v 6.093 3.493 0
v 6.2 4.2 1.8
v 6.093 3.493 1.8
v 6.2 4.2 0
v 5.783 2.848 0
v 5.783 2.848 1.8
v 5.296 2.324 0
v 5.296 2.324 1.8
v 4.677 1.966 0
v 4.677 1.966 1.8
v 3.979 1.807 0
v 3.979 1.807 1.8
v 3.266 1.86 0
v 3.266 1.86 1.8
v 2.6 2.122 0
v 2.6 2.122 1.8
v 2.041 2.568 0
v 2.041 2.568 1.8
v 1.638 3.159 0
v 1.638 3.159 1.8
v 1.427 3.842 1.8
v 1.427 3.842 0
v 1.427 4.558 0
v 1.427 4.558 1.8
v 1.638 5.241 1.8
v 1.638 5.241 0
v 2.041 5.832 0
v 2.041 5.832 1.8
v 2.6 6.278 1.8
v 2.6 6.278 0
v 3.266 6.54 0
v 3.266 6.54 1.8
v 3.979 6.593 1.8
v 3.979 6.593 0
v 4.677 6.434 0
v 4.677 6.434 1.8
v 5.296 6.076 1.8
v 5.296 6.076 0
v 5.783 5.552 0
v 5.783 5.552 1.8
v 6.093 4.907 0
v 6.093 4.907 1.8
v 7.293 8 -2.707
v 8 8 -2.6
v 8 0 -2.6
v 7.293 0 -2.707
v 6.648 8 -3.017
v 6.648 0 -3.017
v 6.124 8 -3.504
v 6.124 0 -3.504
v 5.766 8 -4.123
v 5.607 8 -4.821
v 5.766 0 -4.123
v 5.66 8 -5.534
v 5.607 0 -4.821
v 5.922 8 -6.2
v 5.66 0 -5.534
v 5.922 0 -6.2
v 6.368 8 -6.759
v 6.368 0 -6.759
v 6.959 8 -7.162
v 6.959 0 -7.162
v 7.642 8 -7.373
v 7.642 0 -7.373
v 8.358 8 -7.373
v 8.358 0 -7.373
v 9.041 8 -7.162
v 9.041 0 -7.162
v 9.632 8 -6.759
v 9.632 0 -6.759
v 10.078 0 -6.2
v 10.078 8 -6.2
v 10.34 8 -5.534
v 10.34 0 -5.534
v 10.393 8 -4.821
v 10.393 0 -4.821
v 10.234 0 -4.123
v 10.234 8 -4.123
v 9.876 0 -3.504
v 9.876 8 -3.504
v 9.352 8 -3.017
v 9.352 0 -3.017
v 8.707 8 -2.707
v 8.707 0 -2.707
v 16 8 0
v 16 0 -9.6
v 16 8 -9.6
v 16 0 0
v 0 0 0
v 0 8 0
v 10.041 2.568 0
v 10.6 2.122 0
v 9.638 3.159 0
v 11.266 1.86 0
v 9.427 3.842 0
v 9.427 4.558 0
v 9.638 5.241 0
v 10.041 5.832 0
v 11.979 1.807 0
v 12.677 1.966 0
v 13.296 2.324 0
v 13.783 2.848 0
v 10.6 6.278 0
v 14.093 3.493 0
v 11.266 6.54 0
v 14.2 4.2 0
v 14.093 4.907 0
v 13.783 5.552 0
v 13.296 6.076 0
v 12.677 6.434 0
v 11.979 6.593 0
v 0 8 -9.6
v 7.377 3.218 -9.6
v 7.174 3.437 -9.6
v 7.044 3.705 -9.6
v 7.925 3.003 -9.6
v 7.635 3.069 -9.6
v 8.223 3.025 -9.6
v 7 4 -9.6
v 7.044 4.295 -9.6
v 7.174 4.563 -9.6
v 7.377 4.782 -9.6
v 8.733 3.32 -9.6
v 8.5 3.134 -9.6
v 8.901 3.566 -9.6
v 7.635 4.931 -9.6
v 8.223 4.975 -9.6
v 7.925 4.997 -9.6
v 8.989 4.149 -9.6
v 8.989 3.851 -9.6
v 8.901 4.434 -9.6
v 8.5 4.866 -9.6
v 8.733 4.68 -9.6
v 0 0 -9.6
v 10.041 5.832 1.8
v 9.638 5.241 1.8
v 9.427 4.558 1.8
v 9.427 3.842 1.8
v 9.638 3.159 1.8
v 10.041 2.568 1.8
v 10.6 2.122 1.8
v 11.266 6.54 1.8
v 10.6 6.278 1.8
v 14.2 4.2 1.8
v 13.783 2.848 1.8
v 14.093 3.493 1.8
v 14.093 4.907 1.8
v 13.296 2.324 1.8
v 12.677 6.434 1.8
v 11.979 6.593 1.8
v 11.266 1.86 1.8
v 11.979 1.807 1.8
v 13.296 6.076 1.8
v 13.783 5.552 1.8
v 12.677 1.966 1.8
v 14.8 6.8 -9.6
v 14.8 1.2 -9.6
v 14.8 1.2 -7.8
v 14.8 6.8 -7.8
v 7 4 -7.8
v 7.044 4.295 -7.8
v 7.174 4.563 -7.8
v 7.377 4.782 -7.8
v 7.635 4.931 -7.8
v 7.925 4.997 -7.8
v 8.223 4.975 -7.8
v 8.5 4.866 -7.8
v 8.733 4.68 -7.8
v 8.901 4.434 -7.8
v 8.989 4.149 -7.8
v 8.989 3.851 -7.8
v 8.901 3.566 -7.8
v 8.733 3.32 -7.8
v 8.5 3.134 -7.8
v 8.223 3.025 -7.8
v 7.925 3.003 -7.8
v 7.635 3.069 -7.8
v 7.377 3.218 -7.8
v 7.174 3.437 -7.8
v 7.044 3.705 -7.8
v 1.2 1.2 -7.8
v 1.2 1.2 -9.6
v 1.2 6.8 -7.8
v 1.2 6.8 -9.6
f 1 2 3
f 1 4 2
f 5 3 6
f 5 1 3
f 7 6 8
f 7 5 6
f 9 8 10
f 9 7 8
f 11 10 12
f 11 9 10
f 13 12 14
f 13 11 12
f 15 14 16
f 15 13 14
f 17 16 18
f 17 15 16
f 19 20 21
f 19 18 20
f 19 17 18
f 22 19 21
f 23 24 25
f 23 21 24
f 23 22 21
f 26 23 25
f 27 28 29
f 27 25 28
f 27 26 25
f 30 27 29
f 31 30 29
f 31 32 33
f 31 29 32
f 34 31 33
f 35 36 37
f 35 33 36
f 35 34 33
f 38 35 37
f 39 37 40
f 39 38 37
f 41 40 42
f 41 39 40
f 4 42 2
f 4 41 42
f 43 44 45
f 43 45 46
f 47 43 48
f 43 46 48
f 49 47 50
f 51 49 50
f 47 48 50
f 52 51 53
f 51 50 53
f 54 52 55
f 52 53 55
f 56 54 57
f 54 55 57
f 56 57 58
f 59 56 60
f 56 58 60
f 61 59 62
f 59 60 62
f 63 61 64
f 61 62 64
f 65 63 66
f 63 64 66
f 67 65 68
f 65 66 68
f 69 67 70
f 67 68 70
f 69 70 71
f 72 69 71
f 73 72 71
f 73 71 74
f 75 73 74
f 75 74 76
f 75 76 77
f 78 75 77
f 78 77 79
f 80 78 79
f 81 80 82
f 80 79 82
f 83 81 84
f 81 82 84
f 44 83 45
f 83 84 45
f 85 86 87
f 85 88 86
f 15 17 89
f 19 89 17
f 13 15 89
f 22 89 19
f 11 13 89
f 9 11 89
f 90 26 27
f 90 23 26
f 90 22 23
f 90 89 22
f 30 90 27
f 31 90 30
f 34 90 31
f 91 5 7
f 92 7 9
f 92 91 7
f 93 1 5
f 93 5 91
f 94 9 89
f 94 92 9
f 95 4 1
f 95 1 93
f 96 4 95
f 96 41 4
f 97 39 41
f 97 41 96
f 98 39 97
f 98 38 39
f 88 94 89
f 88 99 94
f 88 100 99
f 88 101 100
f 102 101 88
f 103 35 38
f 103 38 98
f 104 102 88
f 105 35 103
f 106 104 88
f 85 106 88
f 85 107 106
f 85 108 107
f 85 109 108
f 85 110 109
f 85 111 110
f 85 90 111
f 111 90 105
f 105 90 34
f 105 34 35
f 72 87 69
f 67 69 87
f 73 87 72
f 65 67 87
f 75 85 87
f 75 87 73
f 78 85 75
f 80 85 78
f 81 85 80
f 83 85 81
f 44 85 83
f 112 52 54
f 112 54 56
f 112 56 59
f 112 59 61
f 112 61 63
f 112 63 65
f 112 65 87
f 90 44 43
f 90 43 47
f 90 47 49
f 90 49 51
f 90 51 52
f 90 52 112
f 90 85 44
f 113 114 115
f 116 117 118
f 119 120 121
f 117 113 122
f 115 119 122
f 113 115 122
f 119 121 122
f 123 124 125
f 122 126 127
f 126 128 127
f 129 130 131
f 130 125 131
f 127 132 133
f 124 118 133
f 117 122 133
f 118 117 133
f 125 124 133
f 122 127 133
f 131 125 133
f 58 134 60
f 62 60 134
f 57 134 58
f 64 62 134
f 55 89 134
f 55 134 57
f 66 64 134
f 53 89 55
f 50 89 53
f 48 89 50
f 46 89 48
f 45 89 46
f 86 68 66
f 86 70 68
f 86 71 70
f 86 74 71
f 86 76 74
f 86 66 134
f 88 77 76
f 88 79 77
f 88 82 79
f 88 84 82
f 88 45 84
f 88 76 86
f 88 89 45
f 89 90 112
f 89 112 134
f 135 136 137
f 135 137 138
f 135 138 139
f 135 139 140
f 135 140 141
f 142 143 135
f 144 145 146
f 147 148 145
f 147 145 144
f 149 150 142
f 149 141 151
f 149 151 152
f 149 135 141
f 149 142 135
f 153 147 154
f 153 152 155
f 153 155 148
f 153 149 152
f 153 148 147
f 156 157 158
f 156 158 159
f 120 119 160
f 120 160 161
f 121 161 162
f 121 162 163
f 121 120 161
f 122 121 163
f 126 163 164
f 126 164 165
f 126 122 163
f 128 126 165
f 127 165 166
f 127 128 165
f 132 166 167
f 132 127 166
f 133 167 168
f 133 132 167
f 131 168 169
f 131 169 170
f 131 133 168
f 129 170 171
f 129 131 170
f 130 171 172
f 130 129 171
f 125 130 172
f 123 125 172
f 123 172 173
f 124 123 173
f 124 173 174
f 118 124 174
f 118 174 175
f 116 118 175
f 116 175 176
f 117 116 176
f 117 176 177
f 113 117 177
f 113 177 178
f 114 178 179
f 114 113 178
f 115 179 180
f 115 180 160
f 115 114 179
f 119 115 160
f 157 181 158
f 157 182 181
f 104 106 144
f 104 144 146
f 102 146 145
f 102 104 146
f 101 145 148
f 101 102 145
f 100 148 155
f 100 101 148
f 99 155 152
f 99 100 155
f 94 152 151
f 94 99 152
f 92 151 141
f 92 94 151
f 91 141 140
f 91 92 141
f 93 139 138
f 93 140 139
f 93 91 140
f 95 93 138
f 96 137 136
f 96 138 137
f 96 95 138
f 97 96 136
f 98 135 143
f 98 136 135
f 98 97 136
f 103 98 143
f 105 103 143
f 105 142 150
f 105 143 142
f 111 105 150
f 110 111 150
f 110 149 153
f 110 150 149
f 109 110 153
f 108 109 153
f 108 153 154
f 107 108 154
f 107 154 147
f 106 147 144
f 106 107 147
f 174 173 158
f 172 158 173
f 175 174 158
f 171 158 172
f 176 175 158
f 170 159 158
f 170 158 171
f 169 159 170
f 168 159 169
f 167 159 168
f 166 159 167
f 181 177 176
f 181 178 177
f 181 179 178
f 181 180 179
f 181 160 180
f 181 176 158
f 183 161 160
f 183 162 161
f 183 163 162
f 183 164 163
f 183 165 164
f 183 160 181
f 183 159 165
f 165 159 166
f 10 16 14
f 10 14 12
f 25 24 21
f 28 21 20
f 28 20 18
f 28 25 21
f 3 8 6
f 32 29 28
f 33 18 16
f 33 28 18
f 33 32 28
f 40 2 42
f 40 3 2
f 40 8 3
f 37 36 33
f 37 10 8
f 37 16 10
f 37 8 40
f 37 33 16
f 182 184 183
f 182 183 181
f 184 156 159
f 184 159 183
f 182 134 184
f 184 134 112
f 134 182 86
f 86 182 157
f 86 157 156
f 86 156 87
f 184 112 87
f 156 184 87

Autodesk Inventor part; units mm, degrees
ref_plane "YZ Plane" through (0, 0, 0) normal (1, 0, 0) x (0, 1, 0)
ref_plane "XZ Plane" through (0, 0, 0) normal (0, 1, 0) x (-1, 0, 0)
ref_plane "XY Plane" through (0, 0, 0) normal (0, 0, 1) x (1, 0, 0)
sketch "Sketch1" plane through (0, 0, 0) normal (0, 0, 1) x (1, 0, 0)
  line L0 (0, 0) -> (16, 0)
  line L1 (16, 0) -> (16, 8)
  line L2 (16, 8) -> (0, 8)
  line L3 (0, 8) -> (0, 0)
  dimension "d0" = 16
  dimension "d1" = 8
extrude "Extrusion1" add sketch "Sketch1" against normal blind 9.6
sketch "Sketch2" plane through (0, 0, 0) normal (0, 0, 1) x (1, 0, 0)
  circle A0 centre (3.8, 4.2) radius 2.4
  circle A1 centre (11.8, 4.2) radius 2.4
  line L0 (16, 8) -> (0, 8) projected
  line L1 (0, 0) -> (0, 8) projected
  dimension "d4" = 4.8
  dimension "d5" = 4.8
  dimension "d6" = 3.8
  dimension "d7" = 3.8
  dimension "d8" = 8
extrude "Extrusion2" add sketch "Sketch2" along normal blind 1.8
sketch "Sketch3" plane through (0, 0, -9.6) normal (0, 0, -1) x (-1, 0, 0)
  line L0 (-14.8, 6.8) -> (-1.2, 6.8)
  line L1 (-1.2, 6.8) -> (-1.2, 1.2)
  line L2 (-1.2, 1.2) -> (-14.8, 1.2)
  line L3 (-14.8, 1.2) -> (-14.8, 6.8)
  line L4 (-16, 8) -> (0, 8) projected
  line L5 (-16, 0) -> (-16, 8) projected
  line L6 (-16, 0) -> (0, 0) projected
  line L7 (0, 0) -> (0, 8) projected
  circle A0 centre (-8, 4) radius 1
  dimension "d11" = 1.2
  dimension "d12" = 1.2
  dimension "d13" = 1.2
  dimension "d14" = 1.2
  dimension "d15" = 2
  dimension "d16" = 8
  dimension "d17" = 4
extrude "Extrusion3" cut sketch "Sketch3" against normal blind 1.8 contours L0 L1 L2 L3
sketch "Sketch4" plane through (0, 8, 0) normal (0, 1, 0) x (1, 0, 0)
  line L0 (0, 9.6) -> (16, 9.6) projected
  line L1 (14.8, 7.8) -> (1.2, 7.8) projected
  line L2 (0, 0) -> (0, 9.6) projected
  point P0 (8, 5)
  dimension "d21" = 2.8
  dimension "d22" = 8
hole "Hole1" at (8, 8, -5) direction (0, -1, 0) diameter 4.8 depth 25.4 tip angle 118
properties part number "Yee_1x2BrickWithHole"
